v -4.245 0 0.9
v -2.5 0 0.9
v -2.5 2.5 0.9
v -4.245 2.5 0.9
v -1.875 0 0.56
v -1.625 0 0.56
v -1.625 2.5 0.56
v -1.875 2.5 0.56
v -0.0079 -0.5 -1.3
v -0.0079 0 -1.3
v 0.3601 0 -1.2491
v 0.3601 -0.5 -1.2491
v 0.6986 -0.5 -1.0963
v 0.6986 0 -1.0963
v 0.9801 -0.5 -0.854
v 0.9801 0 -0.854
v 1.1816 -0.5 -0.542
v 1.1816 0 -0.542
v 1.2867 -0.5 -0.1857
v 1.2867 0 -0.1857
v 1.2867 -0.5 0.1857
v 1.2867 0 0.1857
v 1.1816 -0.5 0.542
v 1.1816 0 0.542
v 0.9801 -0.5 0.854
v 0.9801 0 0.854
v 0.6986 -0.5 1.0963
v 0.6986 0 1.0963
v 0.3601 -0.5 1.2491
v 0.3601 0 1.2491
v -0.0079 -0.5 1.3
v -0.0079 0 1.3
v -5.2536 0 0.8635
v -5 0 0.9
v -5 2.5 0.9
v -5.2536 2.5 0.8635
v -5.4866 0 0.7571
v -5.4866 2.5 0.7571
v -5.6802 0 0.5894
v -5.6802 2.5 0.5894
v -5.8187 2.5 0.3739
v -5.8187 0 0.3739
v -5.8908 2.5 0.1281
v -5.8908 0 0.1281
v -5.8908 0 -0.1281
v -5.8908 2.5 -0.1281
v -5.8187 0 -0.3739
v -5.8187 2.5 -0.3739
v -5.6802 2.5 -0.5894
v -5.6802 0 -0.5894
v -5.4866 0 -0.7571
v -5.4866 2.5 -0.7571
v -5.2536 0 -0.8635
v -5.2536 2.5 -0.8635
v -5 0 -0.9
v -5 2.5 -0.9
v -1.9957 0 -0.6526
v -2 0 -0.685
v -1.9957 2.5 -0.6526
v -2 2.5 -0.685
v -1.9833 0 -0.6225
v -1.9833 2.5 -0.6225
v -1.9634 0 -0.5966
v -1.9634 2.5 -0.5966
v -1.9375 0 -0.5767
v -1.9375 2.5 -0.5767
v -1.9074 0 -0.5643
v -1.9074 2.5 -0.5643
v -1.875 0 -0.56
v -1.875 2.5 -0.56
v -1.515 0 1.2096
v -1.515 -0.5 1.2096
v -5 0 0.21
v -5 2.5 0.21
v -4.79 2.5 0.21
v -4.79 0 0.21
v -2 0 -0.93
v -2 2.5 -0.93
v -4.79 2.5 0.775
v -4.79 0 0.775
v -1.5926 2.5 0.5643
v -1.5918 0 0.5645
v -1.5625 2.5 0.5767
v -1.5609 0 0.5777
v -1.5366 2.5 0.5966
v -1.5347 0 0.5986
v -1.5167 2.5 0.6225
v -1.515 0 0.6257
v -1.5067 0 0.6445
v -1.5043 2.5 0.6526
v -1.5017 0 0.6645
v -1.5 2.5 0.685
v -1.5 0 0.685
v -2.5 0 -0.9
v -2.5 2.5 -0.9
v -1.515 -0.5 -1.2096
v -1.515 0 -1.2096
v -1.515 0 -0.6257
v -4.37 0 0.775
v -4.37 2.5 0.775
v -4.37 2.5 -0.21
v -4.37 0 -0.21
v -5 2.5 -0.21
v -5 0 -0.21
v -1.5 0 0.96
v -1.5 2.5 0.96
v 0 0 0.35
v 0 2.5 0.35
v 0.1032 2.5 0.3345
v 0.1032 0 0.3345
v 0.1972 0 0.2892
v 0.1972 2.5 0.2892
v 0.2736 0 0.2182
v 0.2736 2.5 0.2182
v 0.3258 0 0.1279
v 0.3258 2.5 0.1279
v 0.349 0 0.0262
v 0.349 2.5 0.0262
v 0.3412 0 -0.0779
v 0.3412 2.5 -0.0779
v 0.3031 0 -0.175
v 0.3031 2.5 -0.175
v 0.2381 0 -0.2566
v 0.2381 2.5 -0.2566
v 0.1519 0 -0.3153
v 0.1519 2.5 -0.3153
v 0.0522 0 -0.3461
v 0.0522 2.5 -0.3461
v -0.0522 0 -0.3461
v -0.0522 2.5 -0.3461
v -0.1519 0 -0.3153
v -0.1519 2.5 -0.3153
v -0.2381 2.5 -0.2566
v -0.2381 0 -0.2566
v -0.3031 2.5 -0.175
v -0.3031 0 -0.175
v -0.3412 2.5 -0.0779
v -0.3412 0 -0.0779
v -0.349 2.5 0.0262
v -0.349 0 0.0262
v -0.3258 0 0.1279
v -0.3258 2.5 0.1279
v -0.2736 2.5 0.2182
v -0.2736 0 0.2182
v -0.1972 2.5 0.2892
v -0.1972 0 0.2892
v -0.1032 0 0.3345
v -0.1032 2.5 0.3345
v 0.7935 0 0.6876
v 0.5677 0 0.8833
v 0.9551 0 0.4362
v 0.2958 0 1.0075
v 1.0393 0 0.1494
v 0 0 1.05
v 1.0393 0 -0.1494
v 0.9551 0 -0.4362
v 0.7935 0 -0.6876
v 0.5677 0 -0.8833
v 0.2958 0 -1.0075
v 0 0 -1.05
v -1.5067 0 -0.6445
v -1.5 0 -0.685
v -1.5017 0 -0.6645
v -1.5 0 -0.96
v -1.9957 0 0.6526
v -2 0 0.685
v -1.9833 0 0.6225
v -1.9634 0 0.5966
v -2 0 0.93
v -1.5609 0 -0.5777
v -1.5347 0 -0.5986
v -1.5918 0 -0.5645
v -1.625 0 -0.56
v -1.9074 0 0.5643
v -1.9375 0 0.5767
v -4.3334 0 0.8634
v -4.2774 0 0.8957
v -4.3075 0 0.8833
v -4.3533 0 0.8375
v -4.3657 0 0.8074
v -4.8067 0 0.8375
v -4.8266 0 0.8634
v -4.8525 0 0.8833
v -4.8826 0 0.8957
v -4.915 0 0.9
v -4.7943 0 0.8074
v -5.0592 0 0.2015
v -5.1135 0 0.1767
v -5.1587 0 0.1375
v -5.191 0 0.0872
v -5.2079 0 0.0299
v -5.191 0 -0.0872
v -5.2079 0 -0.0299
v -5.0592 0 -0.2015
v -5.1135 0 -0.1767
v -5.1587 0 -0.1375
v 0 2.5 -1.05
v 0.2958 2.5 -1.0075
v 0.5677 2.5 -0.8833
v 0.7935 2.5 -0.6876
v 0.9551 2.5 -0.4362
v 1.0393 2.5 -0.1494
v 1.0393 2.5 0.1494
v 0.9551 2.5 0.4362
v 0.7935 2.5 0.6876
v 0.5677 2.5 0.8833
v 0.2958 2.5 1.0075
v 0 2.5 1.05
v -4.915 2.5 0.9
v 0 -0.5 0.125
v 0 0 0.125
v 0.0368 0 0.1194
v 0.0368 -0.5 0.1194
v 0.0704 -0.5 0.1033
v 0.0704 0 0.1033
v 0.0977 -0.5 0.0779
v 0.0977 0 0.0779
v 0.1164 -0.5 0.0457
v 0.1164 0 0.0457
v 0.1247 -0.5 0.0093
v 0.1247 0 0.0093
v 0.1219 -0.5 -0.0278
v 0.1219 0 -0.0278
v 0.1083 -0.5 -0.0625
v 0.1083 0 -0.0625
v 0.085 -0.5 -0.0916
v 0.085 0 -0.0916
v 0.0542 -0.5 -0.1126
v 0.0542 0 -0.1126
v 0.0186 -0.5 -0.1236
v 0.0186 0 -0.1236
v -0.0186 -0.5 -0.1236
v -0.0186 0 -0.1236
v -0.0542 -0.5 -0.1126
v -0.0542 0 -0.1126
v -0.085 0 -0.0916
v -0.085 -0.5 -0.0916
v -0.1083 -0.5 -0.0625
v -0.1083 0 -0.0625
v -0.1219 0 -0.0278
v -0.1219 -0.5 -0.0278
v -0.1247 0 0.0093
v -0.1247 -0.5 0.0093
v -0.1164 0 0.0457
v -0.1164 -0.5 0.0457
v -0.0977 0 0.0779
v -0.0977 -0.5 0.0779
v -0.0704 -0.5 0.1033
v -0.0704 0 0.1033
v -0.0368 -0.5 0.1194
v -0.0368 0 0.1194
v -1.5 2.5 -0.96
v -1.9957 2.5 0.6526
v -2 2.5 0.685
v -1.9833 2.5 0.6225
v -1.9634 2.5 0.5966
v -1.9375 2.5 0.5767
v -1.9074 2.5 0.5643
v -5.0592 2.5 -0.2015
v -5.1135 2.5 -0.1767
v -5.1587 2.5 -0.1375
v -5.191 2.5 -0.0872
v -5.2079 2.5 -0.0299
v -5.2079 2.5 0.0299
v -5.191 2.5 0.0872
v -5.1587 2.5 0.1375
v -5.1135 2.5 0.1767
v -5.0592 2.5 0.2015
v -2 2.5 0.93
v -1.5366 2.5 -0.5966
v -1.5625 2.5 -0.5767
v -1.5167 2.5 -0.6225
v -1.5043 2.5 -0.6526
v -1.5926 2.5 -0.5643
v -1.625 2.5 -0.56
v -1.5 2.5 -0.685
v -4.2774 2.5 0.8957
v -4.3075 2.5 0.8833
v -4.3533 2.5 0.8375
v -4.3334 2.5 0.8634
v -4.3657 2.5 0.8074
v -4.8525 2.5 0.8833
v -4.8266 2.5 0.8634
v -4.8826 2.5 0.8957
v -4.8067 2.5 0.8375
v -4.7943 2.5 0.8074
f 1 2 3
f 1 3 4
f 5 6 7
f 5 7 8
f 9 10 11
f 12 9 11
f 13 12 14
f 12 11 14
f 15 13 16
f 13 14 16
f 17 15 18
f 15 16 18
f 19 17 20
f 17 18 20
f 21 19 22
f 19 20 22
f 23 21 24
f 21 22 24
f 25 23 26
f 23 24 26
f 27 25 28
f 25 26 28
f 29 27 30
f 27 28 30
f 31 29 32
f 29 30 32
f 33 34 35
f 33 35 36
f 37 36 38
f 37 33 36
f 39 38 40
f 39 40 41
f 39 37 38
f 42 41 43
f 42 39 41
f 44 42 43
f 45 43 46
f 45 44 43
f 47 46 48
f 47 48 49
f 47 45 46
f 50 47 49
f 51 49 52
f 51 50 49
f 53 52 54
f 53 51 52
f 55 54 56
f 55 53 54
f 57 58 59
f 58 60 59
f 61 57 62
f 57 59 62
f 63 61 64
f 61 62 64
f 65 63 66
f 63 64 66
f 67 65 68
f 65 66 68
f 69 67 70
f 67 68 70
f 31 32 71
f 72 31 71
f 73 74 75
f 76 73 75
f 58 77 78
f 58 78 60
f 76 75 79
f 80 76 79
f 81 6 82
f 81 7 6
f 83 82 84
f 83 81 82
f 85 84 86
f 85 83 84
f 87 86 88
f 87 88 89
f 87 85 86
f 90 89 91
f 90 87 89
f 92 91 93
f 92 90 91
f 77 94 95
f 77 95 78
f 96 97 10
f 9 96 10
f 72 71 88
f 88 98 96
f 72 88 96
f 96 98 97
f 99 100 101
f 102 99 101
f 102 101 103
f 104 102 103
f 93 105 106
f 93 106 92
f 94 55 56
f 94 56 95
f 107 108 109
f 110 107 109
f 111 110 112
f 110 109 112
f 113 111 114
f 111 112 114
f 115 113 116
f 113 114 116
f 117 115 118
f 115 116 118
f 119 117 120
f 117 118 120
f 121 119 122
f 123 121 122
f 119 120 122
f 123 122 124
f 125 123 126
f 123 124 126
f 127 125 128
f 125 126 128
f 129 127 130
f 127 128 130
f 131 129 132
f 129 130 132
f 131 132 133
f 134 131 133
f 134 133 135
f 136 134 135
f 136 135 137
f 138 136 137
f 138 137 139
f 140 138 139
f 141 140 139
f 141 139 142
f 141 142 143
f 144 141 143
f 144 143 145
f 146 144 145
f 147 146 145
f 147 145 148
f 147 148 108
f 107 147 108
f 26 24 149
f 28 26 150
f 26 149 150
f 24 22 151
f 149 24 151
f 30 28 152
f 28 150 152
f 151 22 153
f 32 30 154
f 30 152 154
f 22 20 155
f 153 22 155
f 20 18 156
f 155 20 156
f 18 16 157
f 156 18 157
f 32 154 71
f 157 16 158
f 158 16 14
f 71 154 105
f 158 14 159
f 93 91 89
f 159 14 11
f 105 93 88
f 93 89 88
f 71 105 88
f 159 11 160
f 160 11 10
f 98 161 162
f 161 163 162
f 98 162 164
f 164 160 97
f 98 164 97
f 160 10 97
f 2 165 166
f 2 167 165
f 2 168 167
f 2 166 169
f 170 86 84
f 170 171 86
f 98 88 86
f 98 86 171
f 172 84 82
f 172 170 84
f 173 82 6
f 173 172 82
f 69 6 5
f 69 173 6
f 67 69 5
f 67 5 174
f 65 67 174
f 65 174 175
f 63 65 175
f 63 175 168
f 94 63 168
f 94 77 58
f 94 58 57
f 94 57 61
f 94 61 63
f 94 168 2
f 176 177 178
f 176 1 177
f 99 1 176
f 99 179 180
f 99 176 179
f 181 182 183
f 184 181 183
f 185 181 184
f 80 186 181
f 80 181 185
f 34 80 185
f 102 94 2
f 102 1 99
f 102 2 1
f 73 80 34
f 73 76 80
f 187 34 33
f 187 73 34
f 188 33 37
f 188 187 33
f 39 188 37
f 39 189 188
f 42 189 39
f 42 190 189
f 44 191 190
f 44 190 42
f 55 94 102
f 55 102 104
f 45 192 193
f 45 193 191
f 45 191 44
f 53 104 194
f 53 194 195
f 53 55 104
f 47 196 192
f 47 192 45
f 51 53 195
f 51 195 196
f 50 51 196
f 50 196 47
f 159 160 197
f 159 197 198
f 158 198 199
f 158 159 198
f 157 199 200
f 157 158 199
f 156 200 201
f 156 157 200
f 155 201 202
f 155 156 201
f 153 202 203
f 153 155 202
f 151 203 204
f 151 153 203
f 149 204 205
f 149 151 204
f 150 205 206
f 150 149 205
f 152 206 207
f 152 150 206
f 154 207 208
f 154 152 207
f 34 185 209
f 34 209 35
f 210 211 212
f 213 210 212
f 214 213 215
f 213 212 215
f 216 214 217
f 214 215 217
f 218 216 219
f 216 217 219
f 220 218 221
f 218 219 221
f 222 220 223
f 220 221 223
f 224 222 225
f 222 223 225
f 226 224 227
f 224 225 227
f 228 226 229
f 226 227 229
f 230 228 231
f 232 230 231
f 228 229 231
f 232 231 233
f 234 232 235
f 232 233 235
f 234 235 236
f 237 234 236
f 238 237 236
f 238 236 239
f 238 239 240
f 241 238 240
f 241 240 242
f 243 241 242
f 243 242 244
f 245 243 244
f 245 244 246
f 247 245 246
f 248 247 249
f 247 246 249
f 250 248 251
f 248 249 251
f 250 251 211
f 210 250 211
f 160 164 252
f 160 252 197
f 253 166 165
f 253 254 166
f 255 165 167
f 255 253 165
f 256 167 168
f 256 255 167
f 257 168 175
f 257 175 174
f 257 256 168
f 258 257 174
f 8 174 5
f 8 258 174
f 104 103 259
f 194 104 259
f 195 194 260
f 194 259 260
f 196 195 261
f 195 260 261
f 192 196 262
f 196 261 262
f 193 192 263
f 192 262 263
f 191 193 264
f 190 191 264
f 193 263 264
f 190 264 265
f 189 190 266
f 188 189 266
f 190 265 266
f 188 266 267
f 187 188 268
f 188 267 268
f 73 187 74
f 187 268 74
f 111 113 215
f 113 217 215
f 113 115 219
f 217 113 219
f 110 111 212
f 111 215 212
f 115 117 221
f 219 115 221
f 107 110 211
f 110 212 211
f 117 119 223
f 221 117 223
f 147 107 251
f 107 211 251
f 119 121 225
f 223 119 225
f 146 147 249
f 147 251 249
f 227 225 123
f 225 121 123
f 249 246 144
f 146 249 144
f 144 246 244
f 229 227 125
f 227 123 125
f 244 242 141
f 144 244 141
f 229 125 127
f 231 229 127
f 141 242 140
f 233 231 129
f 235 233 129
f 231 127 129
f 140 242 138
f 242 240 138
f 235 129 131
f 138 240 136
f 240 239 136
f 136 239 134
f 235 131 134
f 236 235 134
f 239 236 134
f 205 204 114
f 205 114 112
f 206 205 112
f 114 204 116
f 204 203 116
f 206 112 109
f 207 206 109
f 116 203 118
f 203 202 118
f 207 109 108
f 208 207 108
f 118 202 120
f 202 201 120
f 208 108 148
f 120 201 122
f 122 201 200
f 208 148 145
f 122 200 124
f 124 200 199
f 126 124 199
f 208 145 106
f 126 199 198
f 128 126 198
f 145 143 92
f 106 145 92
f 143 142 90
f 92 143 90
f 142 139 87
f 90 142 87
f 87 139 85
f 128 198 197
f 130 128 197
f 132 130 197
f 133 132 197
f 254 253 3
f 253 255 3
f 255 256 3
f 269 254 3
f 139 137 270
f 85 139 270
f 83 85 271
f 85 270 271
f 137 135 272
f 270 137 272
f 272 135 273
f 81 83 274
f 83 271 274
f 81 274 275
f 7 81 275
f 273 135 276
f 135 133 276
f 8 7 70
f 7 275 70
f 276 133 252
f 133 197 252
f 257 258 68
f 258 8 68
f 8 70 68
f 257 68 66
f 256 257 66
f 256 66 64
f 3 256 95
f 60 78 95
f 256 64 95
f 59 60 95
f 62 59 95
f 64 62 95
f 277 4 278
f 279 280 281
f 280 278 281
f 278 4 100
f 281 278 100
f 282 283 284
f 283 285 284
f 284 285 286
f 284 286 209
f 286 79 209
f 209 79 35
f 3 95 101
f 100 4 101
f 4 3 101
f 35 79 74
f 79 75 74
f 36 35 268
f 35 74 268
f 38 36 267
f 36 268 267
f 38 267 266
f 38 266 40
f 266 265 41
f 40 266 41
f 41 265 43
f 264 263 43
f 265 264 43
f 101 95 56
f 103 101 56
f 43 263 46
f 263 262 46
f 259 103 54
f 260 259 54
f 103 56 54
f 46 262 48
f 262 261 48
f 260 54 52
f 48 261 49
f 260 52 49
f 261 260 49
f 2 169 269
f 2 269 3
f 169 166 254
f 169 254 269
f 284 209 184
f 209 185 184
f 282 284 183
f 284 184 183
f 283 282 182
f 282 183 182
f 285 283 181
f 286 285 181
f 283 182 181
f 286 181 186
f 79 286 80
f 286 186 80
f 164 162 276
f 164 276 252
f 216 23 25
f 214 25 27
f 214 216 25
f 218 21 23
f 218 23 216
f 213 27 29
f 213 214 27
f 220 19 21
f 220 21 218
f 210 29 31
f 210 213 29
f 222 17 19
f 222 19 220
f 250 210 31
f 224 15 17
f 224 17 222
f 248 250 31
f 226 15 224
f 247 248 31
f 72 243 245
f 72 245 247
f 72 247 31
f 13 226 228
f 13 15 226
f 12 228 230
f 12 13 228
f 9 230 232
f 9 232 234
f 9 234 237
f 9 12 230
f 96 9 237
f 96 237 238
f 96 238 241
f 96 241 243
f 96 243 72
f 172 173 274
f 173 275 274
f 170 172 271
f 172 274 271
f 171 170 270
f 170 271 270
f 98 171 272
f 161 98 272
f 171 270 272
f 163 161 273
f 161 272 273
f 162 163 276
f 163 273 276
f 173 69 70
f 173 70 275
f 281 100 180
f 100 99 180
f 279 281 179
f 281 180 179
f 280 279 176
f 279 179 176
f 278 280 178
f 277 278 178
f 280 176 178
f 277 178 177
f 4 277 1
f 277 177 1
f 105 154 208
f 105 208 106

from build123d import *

# Parameters (mm, degrees)
BOSS_EXTRUDE1_DEPTH = 2.5
SKETCH4_R           = 0.35
THROUGH_HOLES_DEPTH = 7.493265742
FILLET1_R           = 0.125
SKETCH5_R           = 0.125
BOSS_EXTRUDE2_DEPTH = 0.5


with BuildPart() as part:
    # Sketch3 → Boss-Extrude1 (new body)
    with BuildSketch(Plane(origin=(0, 0, 0), x_dir=(1, 0, 0), z_dir=(0, 1, 0))):
        with BuildLine():
            Line((-2.5, 0.9), (-2, 0.93))
            Line((-2, 0.93), (-2, 0.56))
            Line((-2, 0.56), (-1.5, 0.56))
            Line((-1.5, 0.56), (-1.5, 0.96))
            Line((-1.5, 0.96), (0, 1.05))
            ThreePointArc((0, 1.05), (1.05, 0), (0, -1.05))
            Line((0, -1.05), (-1.5, -0.96))
            Line((-1.5, -0.96), (-1.5, -0.56))
            Line((-1.5, -0.56), (-2, -0.56))
            Line((-2, -0.56), (-2, -0.93))
            Line((-2, -0.93), (-2.5, -0.9))
            Line((-2.5, -0.9), (-5, -0.9))
            ThreePointArc((-5, -0.9), (-5.9, 0), (-5, 0.9))
            Line((-5, 0.9), (-2.5, 0.9))
        make_face()
    extrude(amount=BOSS_EXTRUDE1_DEPTH)

    # Sketch4 → Through Holes (cut, through all)
    with BuildSketch(Plane(origin=(0, 2.5, 0), x_dir=(1, 0, 0), z_dir=(0, 1, 0))):
        with Locations(Location((0, 0, 0), (0, 0, 270))):
            Circle(SKETCH4_R)
        with BuildLine():
            Line((-4.79, -0.9), (-4.37, -0.9))
            Line((-4.37, -0.9), (-4.37, 0.21))
            Line((-4.37, 0.21), (-5, 0.21))
            ThreePointArc((-5, 0.21), (-5.21, 0), (-5, -0.21))
            Line((-5, -0.21), (-4.79, -0.21))
            Line((-4.79, -0.21), (-4.79, -0.9))
        make_face()
    extrude(amount=-THROUGH_HOLES_DEPTH, mode=Mode.SUBTRACT)

    # Fillet1
    fillet1_edges = [part.edges().sort_by_distance(p)[0] for p in [
        (-2, 1.25, 0.56),
        (-1.5, 1.25, 0.56),
        (-1.5, 1.25, -0.56),
        (-2, 1.25, -0.56),
        (-4.37, 1.25, 0.9),
        (-4.79, 1.25, 0.9),
    ]]
    fillet(fillet1_edges, radius=FILLET1_R)

    # Sketch5 → Boss-Extrude2 (add)
    with BuildSketch(Plane(origin=(0, 0, 0), x_dir=(1, 0, 0), z_dir=(0, 1, 0))):
        with BuildLine():
            Line((-1.514973073, -1.209551211), (-1.514973073, 1.209551211))
            Line((-1.514973073, 1.209551211), (-0.007892579, 1.299976041))
            ThreePointArc((-0.007892579, 1.299976041), (1.3, 0), (-0.007892579, -1.299976041))
            Line((-0.007892579, -1.299976041), (-1.514973073, -1.209551211))
        make_face()
        with Locations(Location((0, 0, 0), (0, 0, 270))):
            Circle(SKETCH5_R, mode=Mode.SUBTRACT)
    extrude(amount=-BOSS_EXTRUDE2_DEPTH)


solid = part.part
